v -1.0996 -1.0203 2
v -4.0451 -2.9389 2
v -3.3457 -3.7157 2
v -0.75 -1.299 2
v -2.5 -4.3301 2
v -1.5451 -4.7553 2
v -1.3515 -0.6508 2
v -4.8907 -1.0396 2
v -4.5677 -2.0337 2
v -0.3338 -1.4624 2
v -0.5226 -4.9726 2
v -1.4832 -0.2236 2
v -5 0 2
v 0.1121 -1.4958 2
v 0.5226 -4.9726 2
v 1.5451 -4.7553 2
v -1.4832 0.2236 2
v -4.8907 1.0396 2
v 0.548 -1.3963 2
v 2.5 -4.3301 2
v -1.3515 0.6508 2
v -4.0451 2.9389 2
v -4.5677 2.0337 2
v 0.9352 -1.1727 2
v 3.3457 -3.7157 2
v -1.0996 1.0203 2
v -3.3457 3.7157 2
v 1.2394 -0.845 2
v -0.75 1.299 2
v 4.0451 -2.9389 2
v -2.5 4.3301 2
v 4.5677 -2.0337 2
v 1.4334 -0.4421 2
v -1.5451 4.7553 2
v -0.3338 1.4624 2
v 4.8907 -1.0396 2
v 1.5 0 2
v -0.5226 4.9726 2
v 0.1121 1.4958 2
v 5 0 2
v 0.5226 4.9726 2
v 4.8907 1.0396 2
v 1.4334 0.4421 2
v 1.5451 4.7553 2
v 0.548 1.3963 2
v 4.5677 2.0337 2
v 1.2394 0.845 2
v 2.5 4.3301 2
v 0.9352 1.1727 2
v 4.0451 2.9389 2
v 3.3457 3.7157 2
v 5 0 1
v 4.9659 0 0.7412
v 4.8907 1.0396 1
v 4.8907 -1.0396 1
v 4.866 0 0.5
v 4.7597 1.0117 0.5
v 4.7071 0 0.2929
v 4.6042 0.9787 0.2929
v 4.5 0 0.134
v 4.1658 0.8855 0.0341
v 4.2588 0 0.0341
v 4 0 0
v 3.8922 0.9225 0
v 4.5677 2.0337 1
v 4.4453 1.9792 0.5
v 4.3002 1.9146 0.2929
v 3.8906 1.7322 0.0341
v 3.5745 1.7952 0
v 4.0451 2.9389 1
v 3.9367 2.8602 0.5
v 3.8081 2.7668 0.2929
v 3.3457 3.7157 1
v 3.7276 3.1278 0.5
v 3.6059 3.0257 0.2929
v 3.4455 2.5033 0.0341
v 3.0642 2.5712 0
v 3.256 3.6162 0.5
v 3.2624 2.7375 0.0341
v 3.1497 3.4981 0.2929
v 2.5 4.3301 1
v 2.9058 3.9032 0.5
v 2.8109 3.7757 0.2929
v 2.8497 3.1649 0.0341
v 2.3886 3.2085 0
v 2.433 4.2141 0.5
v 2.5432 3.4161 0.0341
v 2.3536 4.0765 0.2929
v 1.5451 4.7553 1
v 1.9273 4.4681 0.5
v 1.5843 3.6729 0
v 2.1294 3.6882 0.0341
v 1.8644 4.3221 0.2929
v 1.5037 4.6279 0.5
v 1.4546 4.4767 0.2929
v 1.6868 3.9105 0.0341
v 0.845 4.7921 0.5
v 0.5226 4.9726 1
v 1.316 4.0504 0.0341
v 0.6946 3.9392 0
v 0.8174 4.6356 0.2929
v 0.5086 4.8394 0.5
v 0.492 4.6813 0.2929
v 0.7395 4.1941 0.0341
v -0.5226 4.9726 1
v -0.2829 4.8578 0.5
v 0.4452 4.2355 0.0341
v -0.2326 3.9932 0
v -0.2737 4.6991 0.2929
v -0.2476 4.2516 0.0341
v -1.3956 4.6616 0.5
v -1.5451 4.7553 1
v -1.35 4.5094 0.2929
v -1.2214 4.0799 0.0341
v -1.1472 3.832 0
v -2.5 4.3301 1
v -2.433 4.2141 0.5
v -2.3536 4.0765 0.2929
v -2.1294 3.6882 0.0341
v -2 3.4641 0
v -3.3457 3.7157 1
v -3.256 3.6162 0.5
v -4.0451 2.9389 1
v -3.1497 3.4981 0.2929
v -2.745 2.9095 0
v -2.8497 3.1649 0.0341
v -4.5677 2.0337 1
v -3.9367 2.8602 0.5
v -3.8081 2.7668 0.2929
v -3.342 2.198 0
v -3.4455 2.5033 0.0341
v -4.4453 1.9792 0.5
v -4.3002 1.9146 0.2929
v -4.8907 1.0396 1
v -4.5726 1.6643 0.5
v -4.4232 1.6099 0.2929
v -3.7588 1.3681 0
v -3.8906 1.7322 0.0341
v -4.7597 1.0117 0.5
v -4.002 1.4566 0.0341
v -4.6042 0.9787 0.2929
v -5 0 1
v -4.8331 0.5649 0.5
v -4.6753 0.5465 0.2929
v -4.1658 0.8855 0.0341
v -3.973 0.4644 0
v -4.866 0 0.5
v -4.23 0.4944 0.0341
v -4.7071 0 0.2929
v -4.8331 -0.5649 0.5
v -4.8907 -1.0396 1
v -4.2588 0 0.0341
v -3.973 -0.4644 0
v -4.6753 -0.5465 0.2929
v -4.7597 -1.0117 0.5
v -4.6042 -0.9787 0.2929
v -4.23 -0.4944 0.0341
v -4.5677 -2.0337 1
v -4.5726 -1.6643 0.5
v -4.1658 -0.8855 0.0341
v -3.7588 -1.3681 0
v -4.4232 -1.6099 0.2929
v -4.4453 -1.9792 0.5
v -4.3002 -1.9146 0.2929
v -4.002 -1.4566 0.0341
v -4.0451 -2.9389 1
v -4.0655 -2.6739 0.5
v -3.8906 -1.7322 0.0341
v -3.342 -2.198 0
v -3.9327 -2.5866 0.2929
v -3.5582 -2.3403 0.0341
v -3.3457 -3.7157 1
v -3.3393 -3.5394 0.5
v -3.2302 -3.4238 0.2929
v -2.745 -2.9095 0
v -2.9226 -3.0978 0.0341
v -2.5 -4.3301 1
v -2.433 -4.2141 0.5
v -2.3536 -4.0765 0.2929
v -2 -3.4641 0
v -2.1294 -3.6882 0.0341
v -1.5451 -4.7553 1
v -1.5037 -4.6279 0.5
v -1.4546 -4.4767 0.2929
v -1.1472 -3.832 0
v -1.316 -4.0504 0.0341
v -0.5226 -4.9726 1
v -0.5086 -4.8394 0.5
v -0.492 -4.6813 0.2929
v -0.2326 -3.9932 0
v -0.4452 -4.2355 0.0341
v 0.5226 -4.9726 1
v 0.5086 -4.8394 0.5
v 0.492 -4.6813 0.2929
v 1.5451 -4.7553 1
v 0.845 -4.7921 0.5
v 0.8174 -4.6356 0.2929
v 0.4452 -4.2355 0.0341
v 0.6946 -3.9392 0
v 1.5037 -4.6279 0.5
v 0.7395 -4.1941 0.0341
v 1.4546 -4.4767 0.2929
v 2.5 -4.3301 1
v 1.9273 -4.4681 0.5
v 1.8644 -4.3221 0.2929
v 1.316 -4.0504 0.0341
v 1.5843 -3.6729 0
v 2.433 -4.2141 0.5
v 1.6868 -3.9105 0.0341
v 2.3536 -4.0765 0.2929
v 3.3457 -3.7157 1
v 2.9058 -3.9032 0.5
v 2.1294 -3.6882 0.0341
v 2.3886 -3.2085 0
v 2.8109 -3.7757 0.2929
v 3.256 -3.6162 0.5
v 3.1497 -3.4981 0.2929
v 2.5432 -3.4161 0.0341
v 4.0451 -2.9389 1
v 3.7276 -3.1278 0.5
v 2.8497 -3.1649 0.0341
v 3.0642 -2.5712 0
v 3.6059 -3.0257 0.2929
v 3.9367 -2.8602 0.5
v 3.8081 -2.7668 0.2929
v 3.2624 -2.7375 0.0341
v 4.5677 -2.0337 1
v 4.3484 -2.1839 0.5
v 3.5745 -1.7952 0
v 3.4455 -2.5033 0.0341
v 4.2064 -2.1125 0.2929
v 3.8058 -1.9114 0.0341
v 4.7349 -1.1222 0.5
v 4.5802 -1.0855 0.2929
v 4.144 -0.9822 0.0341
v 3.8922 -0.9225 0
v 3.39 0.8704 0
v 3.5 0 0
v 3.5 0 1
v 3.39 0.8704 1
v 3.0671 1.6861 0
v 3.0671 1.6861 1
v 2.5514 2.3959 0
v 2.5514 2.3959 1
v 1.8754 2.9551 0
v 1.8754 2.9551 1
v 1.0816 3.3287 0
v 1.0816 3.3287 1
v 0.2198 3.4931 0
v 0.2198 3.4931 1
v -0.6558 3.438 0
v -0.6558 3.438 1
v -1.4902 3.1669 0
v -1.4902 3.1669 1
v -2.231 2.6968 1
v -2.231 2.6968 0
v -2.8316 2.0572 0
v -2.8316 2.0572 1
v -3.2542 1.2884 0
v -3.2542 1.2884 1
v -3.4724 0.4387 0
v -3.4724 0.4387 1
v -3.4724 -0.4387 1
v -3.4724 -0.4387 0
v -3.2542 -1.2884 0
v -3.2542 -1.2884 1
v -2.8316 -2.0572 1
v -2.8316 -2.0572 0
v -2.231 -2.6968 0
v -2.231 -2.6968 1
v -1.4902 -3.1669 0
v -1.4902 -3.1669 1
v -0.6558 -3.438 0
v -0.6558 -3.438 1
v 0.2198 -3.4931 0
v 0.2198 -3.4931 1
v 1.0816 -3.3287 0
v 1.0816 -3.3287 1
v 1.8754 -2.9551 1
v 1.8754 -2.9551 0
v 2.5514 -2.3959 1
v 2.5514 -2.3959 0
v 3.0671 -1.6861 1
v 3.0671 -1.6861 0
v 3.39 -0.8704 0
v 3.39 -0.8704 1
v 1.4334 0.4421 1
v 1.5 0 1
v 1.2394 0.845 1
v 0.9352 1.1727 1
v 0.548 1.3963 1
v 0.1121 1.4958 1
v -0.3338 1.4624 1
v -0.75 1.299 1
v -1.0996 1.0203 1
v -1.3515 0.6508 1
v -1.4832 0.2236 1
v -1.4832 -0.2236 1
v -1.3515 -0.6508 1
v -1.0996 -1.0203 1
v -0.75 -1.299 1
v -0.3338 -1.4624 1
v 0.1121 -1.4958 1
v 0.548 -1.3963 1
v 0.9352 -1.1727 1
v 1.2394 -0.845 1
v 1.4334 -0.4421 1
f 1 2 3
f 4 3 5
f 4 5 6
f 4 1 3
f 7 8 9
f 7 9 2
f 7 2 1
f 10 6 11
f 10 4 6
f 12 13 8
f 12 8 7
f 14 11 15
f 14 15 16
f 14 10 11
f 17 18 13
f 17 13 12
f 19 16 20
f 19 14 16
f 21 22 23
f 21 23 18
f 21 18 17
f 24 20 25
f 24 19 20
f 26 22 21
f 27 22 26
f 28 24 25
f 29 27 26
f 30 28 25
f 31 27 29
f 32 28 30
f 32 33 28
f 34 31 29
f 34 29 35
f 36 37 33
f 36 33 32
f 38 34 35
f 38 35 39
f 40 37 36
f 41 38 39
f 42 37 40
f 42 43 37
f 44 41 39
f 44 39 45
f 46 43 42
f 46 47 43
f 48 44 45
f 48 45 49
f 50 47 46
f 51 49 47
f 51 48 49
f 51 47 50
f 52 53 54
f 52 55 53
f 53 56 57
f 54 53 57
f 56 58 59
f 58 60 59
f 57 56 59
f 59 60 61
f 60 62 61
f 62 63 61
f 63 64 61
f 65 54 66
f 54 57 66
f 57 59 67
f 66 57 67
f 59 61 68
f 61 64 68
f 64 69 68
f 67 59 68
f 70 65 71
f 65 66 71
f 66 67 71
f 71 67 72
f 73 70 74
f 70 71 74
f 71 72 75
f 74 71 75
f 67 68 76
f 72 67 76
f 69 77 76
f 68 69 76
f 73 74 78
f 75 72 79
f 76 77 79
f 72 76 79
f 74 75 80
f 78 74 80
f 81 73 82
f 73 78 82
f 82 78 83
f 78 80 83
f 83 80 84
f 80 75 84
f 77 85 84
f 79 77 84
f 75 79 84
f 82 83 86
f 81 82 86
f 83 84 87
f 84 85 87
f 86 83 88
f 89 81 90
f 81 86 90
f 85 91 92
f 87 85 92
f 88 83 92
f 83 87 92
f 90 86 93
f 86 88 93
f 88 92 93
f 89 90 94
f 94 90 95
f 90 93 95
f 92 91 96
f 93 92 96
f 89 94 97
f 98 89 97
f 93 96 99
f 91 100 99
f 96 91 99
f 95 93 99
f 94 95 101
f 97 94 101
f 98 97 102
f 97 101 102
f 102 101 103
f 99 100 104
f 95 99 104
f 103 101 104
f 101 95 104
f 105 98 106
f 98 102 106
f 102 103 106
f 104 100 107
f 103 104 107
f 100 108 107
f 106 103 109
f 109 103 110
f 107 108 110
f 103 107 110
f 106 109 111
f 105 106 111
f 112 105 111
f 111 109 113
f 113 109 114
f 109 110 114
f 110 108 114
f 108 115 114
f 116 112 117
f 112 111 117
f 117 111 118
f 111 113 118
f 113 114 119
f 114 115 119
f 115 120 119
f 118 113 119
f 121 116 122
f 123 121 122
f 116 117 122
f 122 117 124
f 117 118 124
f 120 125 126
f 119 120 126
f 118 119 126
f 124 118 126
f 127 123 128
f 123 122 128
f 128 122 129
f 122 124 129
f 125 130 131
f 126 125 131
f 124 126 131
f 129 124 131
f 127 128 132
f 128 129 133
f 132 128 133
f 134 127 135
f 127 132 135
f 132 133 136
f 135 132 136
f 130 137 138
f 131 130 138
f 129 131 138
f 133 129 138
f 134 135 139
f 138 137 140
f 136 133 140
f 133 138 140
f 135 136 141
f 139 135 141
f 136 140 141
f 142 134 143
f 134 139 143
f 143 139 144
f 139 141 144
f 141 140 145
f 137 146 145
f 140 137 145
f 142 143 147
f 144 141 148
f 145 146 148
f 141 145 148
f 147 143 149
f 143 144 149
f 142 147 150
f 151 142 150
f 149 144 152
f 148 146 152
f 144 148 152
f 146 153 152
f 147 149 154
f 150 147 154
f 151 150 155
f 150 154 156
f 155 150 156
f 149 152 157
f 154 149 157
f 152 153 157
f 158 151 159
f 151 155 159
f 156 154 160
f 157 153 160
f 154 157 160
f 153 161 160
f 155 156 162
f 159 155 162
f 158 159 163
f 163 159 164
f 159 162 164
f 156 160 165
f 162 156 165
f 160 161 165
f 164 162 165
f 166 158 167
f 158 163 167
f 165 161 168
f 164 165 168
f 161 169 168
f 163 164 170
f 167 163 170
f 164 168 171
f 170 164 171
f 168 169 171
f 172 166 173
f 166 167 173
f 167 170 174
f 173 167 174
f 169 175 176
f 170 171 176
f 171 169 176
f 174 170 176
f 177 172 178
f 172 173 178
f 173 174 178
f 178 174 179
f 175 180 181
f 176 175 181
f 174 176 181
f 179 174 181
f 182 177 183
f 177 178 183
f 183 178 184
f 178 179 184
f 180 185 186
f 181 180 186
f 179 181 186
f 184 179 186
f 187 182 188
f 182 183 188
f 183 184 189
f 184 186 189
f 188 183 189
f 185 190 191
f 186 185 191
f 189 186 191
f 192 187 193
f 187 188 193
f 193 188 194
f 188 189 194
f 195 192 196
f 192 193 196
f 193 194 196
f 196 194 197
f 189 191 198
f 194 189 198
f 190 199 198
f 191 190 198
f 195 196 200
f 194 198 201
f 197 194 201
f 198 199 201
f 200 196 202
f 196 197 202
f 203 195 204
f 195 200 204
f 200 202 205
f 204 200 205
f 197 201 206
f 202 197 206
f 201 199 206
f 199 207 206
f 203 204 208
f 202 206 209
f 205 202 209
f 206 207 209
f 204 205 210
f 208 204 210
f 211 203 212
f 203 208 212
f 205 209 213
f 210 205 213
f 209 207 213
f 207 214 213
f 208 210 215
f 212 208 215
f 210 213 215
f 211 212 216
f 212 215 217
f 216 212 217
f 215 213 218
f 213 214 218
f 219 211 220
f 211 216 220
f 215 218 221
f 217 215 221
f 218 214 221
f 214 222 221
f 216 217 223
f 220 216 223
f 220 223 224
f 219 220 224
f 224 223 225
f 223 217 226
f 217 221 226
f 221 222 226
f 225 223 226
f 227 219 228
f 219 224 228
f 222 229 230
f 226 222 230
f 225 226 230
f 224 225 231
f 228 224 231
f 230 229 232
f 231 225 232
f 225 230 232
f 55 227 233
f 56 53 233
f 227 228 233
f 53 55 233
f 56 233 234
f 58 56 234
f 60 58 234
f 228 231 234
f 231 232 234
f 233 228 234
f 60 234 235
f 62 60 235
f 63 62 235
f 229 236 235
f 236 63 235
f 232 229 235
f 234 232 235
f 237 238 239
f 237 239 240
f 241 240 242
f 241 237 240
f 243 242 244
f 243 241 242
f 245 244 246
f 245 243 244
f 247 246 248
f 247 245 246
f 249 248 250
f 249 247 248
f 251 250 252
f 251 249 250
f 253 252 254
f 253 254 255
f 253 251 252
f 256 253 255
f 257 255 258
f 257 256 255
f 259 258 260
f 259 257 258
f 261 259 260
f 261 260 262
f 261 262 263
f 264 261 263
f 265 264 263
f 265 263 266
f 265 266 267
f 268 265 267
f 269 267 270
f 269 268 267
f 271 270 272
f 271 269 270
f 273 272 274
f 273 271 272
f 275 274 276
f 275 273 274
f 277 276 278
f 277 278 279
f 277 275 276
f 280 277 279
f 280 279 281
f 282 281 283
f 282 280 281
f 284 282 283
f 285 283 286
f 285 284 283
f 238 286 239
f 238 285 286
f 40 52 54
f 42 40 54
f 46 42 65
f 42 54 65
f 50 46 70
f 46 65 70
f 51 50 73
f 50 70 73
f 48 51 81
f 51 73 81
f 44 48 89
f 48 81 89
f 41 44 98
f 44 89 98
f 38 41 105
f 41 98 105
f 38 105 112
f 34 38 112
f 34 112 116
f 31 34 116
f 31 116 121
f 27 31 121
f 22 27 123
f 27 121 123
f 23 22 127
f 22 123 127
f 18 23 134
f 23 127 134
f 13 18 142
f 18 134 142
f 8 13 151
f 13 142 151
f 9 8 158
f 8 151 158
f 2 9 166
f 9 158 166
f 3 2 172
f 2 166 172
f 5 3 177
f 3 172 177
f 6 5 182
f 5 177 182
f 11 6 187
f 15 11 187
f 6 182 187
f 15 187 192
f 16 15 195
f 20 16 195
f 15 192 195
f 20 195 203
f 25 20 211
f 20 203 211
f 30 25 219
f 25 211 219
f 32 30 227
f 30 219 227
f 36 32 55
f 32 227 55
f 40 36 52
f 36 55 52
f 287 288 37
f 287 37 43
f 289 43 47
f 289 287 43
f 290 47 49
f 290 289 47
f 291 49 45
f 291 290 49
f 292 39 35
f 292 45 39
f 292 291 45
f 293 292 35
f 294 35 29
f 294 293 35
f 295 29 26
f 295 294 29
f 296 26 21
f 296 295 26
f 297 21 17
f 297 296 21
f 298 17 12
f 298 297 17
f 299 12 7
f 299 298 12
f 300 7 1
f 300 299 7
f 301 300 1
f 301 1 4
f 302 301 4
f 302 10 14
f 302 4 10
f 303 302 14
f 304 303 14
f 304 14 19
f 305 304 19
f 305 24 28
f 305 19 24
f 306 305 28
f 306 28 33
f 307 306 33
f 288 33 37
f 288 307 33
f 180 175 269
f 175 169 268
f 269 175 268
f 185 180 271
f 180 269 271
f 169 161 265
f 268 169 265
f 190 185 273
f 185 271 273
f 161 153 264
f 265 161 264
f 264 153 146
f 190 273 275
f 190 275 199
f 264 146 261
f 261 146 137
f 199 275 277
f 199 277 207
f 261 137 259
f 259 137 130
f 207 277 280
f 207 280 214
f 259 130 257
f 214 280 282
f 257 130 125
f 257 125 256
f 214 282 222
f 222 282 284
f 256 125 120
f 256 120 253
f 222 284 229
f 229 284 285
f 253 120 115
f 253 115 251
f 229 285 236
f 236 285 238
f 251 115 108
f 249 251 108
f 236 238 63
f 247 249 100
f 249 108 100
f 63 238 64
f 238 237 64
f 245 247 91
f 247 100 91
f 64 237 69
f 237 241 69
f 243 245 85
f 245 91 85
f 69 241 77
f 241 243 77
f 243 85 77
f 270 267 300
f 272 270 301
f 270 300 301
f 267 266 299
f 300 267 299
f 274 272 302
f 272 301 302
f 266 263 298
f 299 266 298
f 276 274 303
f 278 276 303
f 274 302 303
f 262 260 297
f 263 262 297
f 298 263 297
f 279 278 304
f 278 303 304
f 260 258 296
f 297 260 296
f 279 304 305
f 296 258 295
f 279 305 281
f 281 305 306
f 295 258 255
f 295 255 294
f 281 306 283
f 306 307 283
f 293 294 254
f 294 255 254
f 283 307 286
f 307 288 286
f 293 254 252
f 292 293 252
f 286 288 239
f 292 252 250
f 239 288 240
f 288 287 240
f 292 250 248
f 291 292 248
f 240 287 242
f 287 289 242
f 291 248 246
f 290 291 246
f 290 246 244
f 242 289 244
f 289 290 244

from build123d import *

# Parameters (mm, degrees)
ESQUISSE1_R             = 5
BOSS_EXTRU_1_DEPTH      = 2
ESQUISSE2_R             = 1.5
ENL_V_MAT_EXTRU_2_DEPTH = 13
ESQUISSE3_R             = 3.5
ENL_V_MAT_EXTRU_4_DEPTH = 1
CONG_1_R                = 1


with BuildPart() as part:
    # Esquisse1 → Boss.-Extru.1 (new body)
    with BuildSketch(Plane.XY):
        Circle(ESQUISSE1_R)
    extrude(amount=BOSS_EXTRU_1_DEPTH)

    # Esquisse2 → Enlèv. mat.-Extru.2 (cut)
    with BuildSketch(Plane.XY):
        Circle(ESQUISSE2_R)
    extrude(amount=ENL_V_MAT_EXTRU_2_DEPTH, mode=Mode.SUBTRACT)

    # Esquisse3 → Enlèv. mat.-Extru.4 (cut)
    with BuildSketch(Plane.XY):
        Circle(ESQUISSE3_R)
    extrude(amount=ENL_V_MAT_EXTRU_4_DEPTH, mode=Mode.SUBTRACT)

    # Congé1
    cong_1_edges = [part.edges().sort_by_distance(p)[0] for p in [
        (-5, 0, 0),
    ]]
    fillet(cong_1_edges, radius=CONG_1_R)


solid = part.part
